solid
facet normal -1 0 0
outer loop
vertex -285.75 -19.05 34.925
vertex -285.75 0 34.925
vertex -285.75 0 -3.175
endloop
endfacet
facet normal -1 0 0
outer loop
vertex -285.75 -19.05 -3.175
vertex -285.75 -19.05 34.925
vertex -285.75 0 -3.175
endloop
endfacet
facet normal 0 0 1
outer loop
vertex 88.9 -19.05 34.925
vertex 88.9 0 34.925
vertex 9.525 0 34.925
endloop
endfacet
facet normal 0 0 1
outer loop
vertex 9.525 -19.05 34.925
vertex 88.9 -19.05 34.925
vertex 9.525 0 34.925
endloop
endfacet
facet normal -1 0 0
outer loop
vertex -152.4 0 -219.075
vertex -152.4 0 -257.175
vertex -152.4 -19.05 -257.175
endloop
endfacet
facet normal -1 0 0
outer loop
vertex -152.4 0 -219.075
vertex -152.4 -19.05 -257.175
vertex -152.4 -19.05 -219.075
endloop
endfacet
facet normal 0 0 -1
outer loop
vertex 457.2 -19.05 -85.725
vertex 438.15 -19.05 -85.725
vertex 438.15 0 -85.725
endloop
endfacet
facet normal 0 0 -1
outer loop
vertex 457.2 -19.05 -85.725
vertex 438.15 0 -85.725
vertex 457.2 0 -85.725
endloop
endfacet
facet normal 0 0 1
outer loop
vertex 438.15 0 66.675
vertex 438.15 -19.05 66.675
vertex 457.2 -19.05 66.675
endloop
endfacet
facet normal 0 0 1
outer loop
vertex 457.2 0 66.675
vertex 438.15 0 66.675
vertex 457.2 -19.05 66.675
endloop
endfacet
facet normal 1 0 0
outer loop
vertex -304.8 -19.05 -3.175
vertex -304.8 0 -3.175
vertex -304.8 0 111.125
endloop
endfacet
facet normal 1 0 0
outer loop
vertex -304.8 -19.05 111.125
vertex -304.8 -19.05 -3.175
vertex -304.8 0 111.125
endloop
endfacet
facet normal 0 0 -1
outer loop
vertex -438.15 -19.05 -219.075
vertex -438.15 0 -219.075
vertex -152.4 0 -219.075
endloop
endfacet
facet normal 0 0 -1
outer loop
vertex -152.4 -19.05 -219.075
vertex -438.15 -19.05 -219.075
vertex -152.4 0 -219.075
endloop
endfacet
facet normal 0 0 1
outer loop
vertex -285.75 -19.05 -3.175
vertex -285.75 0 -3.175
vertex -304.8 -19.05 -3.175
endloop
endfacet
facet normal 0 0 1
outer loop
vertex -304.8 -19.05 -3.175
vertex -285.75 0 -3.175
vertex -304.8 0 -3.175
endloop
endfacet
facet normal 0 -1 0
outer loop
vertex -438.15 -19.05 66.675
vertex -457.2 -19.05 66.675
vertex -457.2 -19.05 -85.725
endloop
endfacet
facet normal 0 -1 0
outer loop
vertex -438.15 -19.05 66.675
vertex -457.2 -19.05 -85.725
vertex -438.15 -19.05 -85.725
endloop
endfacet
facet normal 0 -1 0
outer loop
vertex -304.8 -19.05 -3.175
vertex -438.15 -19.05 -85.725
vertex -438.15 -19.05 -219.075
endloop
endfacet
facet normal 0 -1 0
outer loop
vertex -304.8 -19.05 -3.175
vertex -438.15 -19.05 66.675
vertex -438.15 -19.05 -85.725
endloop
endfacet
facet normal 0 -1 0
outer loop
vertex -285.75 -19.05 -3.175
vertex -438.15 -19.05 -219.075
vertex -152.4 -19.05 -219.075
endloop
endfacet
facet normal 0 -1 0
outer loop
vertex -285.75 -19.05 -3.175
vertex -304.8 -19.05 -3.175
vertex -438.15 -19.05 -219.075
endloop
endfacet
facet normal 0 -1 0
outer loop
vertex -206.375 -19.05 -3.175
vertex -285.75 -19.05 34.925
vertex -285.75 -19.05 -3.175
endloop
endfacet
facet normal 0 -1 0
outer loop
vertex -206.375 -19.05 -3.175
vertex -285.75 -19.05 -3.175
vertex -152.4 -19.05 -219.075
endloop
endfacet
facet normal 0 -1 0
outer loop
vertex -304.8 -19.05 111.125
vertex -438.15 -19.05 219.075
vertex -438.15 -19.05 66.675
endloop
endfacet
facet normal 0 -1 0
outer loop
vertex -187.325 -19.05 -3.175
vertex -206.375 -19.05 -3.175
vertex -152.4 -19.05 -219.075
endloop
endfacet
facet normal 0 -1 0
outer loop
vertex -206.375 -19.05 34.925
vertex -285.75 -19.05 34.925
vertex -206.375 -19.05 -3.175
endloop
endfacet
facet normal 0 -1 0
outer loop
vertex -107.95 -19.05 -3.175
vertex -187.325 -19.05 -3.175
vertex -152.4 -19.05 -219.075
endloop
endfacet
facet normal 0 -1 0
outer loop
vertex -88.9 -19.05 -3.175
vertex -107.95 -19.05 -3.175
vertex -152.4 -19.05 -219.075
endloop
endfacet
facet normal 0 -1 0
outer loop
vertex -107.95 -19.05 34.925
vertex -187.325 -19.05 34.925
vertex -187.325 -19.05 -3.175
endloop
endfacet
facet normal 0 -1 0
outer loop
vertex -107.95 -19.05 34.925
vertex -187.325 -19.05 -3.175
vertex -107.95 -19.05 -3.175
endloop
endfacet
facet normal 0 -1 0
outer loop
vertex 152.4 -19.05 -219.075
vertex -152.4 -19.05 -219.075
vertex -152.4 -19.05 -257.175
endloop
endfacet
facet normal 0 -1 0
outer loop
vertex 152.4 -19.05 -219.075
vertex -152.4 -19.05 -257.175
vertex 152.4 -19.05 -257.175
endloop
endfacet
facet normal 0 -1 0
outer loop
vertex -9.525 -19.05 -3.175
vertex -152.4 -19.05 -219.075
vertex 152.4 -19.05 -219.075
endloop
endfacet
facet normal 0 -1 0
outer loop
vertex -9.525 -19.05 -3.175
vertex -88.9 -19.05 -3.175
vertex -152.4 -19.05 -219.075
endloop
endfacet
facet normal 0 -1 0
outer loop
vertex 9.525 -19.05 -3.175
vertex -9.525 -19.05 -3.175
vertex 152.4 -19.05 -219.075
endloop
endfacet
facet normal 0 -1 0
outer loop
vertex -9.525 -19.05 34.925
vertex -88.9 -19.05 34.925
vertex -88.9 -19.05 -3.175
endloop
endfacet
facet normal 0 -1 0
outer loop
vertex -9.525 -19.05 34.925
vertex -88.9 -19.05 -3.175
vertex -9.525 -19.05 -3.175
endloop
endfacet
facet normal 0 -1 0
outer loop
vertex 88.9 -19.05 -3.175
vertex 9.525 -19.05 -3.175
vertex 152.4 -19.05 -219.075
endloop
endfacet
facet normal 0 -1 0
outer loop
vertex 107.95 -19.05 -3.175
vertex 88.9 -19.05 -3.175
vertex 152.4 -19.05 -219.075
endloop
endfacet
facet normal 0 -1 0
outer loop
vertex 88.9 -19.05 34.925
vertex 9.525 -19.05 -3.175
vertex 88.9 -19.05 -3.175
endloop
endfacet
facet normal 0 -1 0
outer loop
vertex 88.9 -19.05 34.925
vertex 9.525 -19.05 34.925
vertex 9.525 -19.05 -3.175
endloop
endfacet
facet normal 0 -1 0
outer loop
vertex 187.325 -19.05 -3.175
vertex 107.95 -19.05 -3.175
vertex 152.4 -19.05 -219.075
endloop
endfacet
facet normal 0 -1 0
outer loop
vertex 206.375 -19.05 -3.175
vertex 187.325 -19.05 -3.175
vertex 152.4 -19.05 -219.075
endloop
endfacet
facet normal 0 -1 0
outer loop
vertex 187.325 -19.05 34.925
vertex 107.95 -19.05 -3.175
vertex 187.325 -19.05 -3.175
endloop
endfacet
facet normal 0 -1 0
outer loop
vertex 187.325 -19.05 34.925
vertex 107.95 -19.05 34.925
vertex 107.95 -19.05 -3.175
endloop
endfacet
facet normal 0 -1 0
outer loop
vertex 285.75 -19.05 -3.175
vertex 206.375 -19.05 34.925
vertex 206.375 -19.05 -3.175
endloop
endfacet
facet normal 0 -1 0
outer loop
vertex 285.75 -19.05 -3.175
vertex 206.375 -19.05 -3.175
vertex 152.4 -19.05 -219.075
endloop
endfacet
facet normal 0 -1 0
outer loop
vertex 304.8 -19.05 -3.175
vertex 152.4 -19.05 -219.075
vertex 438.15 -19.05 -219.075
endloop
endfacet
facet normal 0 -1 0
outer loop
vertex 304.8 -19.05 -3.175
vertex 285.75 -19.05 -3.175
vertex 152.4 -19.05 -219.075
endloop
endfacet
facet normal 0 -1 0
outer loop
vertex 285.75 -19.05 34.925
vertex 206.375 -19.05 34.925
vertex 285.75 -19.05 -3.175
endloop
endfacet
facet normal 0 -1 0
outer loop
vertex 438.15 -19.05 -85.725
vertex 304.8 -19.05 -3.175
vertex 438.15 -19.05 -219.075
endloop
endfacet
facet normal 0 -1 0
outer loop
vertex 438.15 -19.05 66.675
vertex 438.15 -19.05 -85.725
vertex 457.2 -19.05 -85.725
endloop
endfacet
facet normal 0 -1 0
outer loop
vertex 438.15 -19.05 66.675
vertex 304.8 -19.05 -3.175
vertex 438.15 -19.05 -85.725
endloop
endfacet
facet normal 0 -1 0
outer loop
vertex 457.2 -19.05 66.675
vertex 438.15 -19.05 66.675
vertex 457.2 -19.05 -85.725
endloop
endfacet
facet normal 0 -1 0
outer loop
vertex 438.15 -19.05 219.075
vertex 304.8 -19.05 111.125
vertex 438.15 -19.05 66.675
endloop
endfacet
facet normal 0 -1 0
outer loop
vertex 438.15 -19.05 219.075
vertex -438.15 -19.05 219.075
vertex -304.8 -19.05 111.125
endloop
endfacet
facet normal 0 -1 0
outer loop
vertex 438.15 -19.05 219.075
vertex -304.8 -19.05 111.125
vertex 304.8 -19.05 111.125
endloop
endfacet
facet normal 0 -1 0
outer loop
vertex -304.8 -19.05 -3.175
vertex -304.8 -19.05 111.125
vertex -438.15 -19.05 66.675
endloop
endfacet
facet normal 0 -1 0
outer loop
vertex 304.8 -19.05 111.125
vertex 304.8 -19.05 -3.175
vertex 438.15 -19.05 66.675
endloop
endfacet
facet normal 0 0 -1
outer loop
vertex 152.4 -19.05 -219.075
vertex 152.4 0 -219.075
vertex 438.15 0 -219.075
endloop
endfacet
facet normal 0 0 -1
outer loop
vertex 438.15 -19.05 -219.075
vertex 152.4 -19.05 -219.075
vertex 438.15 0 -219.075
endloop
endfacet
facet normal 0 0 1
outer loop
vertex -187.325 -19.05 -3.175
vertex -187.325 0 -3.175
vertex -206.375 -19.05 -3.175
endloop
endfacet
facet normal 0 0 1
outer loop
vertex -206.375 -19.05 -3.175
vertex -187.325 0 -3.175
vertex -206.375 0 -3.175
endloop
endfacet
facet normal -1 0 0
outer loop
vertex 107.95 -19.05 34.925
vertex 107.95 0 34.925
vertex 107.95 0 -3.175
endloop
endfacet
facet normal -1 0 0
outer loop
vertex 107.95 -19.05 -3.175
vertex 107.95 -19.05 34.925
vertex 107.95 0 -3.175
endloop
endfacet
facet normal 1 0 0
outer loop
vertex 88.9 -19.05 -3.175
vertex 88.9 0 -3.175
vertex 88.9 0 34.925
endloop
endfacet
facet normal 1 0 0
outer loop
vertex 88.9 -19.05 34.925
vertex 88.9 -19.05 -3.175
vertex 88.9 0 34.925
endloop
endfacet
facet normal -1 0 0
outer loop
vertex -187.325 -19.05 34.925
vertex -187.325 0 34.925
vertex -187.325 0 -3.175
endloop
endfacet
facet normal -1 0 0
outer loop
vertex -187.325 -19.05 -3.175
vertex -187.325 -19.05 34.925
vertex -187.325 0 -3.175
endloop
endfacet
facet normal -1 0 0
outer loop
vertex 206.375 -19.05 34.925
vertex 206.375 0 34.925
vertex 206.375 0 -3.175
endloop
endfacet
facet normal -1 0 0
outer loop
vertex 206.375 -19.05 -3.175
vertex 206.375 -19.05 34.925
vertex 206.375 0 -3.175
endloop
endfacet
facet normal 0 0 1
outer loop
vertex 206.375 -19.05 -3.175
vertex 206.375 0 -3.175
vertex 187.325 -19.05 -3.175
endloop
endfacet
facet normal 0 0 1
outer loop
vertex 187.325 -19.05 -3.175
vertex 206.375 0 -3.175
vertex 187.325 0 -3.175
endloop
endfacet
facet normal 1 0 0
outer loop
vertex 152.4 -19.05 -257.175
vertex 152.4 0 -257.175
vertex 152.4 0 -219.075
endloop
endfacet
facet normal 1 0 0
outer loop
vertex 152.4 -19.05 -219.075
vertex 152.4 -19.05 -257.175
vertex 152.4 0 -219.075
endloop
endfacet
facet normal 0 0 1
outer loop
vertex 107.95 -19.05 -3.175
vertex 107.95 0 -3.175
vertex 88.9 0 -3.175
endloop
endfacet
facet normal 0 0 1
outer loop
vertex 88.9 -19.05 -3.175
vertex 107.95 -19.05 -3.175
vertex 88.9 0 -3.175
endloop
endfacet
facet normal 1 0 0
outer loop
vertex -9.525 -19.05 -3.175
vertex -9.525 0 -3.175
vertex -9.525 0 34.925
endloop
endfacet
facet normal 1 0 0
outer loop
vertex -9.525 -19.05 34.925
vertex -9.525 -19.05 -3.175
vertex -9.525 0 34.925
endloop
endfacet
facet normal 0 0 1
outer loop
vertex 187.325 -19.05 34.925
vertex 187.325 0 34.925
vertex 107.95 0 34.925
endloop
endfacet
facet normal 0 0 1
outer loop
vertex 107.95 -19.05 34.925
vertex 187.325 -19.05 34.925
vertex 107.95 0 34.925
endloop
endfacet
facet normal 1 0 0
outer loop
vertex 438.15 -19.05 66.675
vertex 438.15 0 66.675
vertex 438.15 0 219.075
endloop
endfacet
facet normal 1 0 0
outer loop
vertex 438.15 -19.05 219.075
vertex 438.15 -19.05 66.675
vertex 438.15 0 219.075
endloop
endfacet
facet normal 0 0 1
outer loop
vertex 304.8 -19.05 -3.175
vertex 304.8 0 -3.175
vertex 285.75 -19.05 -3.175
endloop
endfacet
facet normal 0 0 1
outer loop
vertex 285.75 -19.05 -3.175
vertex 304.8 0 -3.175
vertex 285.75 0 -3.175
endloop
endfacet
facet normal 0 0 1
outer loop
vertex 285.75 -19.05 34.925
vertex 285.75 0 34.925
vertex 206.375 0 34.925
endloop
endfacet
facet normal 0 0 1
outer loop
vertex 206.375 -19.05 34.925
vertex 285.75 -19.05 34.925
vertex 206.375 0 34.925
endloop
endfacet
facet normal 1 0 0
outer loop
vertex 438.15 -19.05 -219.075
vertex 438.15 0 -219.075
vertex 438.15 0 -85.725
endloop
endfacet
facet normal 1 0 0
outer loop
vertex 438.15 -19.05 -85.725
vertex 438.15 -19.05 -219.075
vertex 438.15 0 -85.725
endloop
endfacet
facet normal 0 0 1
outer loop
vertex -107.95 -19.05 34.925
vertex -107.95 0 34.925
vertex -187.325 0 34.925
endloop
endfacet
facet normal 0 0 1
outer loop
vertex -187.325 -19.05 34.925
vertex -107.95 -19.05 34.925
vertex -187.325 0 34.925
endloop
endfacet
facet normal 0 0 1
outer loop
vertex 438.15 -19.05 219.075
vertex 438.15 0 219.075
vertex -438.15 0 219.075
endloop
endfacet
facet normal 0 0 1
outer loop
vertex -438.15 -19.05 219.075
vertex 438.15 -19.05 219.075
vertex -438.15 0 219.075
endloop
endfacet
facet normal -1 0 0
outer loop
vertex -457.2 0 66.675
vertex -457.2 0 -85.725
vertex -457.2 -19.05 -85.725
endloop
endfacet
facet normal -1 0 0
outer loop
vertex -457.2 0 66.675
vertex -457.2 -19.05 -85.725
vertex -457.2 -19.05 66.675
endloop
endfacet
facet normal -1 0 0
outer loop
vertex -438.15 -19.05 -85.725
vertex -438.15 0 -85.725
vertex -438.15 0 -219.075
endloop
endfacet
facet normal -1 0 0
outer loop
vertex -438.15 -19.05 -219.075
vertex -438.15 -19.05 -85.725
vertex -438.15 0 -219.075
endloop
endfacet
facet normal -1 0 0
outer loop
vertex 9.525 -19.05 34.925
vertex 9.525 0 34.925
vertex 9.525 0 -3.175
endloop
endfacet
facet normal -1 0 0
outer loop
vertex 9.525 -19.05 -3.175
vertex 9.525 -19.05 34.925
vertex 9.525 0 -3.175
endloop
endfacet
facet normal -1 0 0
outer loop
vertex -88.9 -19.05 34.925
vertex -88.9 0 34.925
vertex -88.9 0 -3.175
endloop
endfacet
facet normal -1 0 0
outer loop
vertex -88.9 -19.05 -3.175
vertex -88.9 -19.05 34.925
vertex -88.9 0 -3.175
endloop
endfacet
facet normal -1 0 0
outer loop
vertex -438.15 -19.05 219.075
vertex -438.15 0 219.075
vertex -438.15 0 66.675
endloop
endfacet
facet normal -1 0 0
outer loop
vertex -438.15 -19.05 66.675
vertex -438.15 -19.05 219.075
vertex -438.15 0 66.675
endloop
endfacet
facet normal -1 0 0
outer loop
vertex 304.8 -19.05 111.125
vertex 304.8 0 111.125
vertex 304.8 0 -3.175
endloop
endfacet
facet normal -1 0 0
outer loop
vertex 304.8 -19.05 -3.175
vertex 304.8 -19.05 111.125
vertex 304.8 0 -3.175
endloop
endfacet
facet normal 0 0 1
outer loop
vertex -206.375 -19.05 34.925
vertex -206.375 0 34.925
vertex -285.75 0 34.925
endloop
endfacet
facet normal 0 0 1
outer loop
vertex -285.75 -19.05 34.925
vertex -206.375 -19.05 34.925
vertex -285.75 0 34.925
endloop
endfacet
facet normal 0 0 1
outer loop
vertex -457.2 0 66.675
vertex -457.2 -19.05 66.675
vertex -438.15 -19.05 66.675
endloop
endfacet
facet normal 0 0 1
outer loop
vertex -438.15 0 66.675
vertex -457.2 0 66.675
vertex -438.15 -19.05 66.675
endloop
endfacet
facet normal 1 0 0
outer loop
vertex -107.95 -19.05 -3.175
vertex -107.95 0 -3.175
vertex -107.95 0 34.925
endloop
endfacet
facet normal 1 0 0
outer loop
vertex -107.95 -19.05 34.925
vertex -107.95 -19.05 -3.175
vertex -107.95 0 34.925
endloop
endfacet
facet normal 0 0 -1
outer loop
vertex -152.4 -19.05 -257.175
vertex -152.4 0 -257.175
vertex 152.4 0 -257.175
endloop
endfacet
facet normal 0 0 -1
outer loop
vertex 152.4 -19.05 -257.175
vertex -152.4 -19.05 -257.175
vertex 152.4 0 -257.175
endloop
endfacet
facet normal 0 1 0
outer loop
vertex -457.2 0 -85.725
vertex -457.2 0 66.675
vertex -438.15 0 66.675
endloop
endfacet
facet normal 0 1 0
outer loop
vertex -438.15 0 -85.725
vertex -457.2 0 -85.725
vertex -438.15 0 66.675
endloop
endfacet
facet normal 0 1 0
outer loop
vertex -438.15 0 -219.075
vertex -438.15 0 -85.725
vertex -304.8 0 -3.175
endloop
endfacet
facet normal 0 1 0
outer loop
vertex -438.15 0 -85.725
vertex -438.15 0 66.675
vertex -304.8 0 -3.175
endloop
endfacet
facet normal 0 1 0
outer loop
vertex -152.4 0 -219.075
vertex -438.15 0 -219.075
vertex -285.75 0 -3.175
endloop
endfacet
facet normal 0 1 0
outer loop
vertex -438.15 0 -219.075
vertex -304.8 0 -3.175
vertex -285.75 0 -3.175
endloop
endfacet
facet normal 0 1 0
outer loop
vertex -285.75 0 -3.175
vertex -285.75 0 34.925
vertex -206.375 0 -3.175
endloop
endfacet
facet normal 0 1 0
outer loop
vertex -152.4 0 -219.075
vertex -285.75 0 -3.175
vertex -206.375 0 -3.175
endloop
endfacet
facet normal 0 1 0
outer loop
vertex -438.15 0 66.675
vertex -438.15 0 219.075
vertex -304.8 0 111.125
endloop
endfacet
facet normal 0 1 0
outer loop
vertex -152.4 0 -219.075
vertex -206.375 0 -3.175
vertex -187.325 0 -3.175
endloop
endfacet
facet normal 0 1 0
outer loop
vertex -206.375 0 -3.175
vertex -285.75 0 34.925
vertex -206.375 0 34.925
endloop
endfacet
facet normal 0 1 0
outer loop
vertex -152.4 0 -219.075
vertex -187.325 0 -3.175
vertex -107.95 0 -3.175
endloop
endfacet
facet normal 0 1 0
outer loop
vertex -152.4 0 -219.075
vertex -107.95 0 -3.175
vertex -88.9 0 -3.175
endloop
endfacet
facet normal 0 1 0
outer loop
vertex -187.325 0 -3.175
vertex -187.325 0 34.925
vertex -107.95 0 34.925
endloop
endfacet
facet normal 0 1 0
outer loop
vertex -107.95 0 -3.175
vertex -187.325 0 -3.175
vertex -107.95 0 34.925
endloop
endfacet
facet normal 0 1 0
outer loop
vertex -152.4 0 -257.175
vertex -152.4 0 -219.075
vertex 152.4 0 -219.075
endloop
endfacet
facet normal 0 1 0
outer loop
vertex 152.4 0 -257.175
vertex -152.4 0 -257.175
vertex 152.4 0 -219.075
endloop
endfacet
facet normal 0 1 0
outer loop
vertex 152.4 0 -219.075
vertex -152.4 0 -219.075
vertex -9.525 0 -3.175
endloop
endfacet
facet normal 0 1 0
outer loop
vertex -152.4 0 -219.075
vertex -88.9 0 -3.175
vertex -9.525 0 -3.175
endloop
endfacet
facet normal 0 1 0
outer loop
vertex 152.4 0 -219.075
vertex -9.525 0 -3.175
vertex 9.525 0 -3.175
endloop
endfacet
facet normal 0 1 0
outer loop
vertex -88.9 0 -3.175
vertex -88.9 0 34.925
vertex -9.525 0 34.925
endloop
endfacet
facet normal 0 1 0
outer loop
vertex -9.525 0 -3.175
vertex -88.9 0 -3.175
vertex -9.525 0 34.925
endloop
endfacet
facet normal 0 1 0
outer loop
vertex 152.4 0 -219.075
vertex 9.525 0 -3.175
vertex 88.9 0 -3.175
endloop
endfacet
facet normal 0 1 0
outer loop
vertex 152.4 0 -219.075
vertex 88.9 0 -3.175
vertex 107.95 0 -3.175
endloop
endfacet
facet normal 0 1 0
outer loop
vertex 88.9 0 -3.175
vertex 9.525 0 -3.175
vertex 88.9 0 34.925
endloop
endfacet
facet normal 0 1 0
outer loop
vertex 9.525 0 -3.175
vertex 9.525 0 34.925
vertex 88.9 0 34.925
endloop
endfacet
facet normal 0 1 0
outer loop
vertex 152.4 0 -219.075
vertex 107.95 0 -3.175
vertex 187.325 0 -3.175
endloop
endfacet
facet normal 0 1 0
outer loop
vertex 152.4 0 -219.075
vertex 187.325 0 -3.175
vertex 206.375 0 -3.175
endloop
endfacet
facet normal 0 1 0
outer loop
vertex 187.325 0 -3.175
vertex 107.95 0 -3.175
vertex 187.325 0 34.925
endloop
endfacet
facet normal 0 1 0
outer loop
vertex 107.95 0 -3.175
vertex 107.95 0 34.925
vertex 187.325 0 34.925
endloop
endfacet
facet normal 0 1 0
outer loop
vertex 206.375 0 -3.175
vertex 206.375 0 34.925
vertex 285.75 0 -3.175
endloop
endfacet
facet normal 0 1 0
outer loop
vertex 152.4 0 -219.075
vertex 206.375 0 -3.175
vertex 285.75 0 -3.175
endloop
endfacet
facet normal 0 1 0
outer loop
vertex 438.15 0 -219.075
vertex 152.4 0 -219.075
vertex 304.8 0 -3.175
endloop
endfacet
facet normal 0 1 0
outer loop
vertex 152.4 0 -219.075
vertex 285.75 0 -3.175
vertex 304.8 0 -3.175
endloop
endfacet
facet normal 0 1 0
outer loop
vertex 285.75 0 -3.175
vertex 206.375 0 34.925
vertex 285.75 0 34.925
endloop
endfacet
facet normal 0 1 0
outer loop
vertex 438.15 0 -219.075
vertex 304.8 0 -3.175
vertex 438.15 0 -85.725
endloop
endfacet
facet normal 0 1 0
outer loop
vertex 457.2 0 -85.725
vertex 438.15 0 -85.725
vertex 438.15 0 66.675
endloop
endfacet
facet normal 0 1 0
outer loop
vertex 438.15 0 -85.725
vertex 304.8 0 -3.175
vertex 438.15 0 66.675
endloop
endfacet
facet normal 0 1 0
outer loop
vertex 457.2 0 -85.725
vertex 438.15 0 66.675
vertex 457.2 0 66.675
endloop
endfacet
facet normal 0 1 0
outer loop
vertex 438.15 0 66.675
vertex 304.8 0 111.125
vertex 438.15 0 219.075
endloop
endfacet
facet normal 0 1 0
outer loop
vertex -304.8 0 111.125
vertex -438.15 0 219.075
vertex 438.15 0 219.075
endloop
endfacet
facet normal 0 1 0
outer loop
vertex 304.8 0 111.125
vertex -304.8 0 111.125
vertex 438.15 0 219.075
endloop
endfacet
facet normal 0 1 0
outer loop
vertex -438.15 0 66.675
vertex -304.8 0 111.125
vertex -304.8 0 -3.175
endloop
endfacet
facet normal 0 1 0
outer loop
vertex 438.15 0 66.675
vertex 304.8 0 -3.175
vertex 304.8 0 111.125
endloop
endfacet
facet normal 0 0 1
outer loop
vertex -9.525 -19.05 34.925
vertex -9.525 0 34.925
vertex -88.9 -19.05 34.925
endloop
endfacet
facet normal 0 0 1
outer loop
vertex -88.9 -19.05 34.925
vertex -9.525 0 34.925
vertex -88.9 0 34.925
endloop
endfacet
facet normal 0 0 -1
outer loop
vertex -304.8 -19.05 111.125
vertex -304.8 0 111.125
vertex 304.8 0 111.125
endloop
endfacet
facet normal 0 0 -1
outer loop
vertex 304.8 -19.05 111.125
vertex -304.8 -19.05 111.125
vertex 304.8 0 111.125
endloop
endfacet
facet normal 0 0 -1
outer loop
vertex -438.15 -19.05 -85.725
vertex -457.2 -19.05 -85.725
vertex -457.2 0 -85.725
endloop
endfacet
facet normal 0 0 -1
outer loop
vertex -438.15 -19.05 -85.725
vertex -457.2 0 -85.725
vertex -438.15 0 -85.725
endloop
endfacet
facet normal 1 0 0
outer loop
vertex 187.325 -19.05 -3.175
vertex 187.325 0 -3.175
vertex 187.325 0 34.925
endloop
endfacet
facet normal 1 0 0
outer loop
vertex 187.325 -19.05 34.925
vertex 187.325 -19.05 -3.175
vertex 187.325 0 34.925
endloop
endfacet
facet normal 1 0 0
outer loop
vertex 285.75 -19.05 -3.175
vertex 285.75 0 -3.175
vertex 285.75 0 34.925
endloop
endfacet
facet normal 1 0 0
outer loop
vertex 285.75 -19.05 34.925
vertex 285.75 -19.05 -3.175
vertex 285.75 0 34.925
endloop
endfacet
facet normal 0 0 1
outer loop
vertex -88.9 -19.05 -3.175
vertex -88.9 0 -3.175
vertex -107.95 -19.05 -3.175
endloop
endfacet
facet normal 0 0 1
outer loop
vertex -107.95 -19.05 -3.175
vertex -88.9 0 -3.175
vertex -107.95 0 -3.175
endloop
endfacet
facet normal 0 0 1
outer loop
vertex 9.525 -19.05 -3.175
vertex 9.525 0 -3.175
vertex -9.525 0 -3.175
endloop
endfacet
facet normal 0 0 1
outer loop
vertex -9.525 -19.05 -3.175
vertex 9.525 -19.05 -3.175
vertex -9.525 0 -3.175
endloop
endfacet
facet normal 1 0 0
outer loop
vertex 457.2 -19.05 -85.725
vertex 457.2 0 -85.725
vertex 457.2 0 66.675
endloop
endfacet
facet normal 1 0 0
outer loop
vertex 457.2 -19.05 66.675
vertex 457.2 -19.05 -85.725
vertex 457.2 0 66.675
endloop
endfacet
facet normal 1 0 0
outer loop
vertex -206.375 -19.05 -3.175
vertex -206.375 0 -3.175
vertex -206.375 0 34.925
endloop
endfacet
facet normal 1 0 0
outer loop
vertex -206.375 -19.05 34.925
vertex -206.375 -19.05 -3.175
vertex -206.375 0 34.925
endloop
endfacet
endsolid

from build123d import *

# Parameters (mm, degrees)
F0_W     = 19.05
F0_H     = 152.4
F0_W_2   = 304.8
F0_H_2   = 38.1
F1_DEPTH = 19.05


# Not quite as in the source:
# - a feature names something its author has since deleted; it is built from what else it names


with BuildPart() as f1:
    # F0 (on Front) → F1 (new body)
    with BuildSketch(Plane.XZ):
        Polygon((438.15, 219.075), (-438.15, 219.075), (-438.15, 66.675), (-438.15, -85.725), (-438.15, -219.075), (-152.4, -219.075), (152.4, -219.075), (438.15, -219.075), (438.15, -85.725), (438.15, 66.675), align=None)
        Polygon((-304.8, 111.125), (304.8, 111.125), (304.8, 34.925), (304.8, -3.175), (285.75, -3.175), (285.75, 34.925), (206.375, 34.925), (206.375, -3.175), (187.325, -3.175), (187.325, 34.925), (107.95, 34.925), (107.95, -3.175), (88.9, -3.175), (88.9, 34.925), (9.525, 34.925), (9.525, -3.175), (-9.525, -3.175), (-9.525, 34.925), (-88.9, 34.925), (-88.9, -3.175), (-107.95, -3.175), (-107.95, 34.925), (-187.325, 34.925), (-187.325, -3.175), (-206.375, -3.175), (-206.375, 34.925), (-285.75, 34.925), (-285.75, -3.175), (-304.8, -3.175), (-304.8, 34.925), align=None, mode=Mode.SUBTRACT)
        with Locations((-447.675, -9.525)):
            Rectangle(F0_W, F0_H)
        with Locations((0, -238.125)):
            Rectangle(F0_W_2, F0_H_2)
        with Locations((447.675, -9.525)):
            Rectangle(F0_W, F0_H)
    extrude(amount=F1_DEPTH)


solid = f1.part
